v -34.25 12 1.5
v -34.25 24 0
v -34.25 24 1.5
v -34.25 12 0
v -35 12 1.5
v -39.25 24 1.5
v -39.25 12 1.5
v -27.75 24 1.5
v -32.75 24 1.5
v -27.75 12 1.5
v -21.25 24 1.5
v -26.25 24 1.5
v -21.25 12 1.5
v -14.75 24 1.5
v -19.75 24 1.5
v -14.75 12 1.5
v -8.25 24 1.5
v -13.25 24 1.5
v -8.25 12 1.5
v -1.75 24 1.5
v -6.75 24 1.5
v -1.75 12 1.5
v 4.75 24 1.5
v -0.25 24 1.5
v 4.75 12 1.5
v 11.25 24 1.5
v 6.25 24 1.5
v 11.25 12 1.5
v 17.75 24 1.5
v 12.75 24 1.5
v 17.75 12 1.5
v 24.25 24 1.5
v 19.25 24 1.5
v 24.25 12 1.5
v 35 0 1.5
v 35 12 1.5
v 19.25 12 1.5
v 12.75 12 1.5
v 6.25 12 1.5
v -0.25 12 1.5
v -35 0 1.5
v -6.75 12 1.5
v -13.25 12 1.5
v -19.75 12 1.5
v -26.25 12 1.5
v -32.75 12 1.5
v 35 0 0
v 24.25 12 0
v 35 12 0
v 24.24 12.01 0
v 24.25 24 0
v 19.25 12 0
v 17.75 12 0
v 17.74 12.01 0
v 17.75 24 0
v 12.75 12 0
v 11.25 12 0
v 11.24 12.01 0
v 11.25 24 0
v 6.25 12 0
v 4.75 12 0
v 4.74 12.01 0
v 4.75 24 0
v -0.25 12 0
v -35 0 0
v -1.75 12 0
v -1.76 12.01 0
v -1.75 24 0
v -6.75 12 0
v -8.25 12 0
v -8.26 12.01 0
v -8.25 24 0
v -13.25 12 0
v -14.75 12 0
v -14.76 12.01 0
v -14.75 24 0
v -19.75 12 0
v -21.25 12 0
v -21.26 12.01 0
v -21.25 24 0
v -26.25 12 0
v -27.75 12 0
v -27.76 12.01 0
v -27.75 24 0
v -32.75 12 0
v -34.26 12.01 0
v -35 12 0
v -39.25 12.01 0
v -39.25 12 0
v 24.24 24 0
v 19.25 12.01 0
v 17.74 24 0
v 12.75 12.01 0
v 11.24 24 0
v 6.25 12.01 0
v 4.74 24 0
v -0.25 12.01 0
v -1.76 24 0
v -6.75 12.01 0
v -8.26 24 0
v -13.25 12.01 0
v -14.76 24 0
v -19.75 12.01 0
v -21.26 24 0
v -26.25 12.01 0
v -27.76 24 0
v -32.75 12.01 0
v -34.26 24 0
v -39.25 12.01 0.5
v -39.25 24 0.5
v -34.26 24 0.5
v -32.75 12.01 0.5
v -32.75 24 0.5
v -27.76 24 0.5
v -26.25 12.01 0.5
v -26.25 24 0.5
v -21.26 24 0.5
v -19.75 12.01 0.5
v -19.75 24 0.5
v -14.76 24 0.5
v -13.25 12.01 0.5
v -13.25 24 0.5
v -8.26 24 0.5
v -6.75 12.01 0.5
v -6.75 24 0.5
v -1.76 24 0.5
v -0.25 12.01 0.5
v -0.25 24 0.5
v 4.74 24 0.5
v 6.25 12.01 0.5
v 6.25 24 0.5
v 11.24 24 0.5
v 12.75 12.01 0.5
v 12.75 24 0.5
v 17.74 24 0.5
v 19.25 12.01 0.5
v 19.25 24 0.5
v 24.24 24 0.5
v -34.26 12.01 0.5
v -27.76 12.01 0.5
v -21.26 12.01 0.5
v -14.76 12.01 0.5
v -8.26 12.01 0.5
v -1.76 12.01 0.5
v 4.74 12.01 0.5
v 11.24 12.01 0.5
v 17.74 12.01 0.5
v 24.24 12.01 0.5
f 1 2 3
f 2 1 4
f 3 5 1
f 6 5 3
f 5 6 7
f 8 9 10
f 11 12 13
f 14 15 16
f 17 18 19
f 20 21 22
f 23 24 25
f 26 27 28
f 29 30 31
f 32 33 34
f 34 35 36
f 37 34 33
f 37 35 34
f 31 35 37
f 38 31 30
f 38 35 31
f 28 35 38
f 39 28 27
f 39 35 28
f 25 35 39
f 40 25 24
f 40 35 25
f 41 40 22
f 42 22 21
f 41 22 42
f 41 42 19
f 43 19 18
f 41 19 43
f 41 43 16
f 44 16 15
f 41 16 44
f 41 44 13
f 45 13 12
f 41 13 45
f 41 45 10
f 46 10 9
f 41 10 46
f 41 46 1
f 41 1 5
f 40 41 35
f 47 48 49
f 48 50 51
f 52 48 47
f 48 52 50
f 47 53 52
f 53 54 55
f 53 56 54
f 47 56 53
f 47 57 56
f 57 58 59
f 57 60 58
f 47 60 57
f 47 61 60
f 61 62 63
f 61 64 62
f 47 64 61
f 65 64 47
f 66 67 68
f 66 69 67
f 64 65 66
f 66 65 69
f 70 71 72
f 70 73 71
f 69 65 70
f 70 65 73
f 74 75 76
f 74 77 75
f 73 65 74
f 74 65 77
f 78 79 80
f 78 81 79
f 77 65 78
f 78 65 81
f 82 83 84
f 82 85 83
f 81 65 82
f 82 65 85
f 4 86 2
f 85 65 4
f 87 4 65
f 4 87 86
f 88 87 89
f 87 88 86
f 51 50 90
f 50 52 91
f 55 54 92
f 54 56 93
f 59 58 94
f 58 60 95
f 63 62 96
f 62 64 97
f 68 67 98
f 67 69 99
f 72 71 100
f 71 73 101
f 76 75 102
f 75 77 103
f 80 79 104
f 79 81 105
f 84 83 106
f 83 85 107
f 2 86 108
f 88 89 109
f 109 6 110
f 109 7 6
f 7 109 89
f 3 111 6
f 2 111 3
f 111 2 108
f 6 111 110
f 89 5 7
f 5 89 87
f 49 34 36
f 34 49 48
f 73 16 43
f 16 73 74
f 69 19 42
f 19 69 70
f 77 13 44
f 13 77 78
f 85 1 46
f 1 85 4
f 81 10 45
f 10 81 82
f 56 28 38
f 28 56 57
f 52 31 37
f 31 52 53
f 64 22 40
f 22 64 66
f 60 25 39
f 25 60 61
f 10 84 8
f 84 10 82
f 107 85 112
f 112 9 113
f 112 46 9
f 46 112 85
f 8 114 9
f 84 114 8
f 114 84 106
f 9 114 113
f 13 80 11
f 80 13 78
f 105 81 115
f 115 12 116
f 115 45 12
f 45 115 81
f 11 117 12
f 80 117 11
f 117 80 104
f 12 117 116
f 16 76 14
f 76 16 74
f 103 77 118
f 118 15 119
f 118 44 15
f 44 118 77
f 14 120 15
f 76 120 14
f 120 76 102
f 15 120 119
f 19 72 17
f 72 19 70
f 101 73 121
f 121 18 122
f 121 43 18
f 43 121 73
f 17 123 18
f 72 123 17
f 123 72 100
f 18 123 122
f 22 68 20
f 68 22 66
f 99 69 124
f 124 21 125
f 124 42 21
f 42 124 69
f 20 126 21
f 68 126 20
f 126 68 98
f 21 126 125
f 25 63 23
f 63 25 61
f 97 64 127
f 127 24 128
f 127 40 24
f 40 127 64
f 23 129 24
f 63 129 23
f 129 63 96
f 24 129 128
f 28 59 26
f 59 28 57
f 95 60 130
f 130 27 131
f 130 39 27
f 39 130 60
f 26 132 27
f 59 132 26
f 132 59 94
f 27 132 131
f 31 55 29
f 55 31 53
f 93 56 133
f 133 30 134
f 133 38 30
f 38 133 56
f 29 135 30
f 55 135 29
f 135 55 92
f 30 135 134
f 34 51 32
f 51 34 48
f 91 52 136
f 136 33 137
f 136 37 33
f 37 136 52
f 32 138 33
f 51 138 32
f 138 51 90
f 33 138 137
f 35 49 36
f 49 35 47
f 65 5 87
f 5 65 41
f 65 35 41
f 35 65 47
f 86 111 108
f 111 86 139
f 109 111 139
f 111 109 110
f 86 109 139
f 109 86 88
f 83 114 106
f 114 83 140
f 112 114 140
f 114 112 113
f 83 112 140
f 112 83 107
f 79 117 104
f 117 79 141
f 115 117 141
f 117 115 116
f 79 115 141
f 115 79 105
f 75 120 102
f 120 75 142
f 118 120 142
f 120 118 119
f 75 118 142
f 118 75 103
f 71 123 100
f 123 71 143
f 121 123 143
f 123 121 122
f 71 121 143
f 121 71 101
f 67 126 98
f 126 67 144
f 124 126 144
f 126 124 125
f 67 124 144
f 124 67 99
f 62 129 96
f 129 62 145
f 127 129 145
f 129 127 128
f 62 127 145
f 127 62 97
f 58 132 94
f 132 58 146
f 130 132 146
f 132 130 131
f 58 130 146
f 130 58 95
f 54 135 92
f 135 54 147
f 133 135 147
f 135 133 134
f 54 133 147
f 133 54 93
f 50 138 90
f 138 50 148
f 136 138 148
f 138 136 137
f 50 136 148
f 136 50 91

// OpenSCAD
// 10-well comb for agarose gel casting, printed lying flat
// Units: mm

// ---- Spine ----
spine_len   = 70;    // spine length along X
spine_wid   = 12;    // spine width along Y

// ---- Teeth ----
tooth_count = 10;    // number of wells
tooth_w     = 5.0;   // tooth width along X
tooth_l     = 12;    // tooth length along Y (from top edge of spine)
gap         = 1.5;   // gap between neighbouring teeth

// ---- Misc ----
eps         = 0.5;   // cutter overshoot past faces
$fn         = 64;

// Derived
pitch       = tooth_w + gap;              // centre-to-centre spacing
row_span    = (tooth_count - 1) * gap;    // total gap width
x_start     = -spine_len/2 + tooth_w/2 - row_span/2; // first tooth centre X

difference() {
    // Plate: spine + teeth
    union() {
        // Spine (back bar)
        translate([-spine_len/2, 0, 0])
            cube([spine_len, spine_wid, 1.5]);
        // Teeth
        for (i = [0 : tooth_count - 1])
            translate([x_start + i * pitch, spine_wid, 0])
                cube([tooth_w, tooth_l, 1.5]);
    }

    // Cut out the wells (through the full thickness)
    for (i = [0 : tooth_count - 1])
        translate([x_start + i * pitch - 0.01, spine_wid + 0.01, -eps])
            cube([tooth_w, tooth_l + 0.01, 2 * eps]);
}
